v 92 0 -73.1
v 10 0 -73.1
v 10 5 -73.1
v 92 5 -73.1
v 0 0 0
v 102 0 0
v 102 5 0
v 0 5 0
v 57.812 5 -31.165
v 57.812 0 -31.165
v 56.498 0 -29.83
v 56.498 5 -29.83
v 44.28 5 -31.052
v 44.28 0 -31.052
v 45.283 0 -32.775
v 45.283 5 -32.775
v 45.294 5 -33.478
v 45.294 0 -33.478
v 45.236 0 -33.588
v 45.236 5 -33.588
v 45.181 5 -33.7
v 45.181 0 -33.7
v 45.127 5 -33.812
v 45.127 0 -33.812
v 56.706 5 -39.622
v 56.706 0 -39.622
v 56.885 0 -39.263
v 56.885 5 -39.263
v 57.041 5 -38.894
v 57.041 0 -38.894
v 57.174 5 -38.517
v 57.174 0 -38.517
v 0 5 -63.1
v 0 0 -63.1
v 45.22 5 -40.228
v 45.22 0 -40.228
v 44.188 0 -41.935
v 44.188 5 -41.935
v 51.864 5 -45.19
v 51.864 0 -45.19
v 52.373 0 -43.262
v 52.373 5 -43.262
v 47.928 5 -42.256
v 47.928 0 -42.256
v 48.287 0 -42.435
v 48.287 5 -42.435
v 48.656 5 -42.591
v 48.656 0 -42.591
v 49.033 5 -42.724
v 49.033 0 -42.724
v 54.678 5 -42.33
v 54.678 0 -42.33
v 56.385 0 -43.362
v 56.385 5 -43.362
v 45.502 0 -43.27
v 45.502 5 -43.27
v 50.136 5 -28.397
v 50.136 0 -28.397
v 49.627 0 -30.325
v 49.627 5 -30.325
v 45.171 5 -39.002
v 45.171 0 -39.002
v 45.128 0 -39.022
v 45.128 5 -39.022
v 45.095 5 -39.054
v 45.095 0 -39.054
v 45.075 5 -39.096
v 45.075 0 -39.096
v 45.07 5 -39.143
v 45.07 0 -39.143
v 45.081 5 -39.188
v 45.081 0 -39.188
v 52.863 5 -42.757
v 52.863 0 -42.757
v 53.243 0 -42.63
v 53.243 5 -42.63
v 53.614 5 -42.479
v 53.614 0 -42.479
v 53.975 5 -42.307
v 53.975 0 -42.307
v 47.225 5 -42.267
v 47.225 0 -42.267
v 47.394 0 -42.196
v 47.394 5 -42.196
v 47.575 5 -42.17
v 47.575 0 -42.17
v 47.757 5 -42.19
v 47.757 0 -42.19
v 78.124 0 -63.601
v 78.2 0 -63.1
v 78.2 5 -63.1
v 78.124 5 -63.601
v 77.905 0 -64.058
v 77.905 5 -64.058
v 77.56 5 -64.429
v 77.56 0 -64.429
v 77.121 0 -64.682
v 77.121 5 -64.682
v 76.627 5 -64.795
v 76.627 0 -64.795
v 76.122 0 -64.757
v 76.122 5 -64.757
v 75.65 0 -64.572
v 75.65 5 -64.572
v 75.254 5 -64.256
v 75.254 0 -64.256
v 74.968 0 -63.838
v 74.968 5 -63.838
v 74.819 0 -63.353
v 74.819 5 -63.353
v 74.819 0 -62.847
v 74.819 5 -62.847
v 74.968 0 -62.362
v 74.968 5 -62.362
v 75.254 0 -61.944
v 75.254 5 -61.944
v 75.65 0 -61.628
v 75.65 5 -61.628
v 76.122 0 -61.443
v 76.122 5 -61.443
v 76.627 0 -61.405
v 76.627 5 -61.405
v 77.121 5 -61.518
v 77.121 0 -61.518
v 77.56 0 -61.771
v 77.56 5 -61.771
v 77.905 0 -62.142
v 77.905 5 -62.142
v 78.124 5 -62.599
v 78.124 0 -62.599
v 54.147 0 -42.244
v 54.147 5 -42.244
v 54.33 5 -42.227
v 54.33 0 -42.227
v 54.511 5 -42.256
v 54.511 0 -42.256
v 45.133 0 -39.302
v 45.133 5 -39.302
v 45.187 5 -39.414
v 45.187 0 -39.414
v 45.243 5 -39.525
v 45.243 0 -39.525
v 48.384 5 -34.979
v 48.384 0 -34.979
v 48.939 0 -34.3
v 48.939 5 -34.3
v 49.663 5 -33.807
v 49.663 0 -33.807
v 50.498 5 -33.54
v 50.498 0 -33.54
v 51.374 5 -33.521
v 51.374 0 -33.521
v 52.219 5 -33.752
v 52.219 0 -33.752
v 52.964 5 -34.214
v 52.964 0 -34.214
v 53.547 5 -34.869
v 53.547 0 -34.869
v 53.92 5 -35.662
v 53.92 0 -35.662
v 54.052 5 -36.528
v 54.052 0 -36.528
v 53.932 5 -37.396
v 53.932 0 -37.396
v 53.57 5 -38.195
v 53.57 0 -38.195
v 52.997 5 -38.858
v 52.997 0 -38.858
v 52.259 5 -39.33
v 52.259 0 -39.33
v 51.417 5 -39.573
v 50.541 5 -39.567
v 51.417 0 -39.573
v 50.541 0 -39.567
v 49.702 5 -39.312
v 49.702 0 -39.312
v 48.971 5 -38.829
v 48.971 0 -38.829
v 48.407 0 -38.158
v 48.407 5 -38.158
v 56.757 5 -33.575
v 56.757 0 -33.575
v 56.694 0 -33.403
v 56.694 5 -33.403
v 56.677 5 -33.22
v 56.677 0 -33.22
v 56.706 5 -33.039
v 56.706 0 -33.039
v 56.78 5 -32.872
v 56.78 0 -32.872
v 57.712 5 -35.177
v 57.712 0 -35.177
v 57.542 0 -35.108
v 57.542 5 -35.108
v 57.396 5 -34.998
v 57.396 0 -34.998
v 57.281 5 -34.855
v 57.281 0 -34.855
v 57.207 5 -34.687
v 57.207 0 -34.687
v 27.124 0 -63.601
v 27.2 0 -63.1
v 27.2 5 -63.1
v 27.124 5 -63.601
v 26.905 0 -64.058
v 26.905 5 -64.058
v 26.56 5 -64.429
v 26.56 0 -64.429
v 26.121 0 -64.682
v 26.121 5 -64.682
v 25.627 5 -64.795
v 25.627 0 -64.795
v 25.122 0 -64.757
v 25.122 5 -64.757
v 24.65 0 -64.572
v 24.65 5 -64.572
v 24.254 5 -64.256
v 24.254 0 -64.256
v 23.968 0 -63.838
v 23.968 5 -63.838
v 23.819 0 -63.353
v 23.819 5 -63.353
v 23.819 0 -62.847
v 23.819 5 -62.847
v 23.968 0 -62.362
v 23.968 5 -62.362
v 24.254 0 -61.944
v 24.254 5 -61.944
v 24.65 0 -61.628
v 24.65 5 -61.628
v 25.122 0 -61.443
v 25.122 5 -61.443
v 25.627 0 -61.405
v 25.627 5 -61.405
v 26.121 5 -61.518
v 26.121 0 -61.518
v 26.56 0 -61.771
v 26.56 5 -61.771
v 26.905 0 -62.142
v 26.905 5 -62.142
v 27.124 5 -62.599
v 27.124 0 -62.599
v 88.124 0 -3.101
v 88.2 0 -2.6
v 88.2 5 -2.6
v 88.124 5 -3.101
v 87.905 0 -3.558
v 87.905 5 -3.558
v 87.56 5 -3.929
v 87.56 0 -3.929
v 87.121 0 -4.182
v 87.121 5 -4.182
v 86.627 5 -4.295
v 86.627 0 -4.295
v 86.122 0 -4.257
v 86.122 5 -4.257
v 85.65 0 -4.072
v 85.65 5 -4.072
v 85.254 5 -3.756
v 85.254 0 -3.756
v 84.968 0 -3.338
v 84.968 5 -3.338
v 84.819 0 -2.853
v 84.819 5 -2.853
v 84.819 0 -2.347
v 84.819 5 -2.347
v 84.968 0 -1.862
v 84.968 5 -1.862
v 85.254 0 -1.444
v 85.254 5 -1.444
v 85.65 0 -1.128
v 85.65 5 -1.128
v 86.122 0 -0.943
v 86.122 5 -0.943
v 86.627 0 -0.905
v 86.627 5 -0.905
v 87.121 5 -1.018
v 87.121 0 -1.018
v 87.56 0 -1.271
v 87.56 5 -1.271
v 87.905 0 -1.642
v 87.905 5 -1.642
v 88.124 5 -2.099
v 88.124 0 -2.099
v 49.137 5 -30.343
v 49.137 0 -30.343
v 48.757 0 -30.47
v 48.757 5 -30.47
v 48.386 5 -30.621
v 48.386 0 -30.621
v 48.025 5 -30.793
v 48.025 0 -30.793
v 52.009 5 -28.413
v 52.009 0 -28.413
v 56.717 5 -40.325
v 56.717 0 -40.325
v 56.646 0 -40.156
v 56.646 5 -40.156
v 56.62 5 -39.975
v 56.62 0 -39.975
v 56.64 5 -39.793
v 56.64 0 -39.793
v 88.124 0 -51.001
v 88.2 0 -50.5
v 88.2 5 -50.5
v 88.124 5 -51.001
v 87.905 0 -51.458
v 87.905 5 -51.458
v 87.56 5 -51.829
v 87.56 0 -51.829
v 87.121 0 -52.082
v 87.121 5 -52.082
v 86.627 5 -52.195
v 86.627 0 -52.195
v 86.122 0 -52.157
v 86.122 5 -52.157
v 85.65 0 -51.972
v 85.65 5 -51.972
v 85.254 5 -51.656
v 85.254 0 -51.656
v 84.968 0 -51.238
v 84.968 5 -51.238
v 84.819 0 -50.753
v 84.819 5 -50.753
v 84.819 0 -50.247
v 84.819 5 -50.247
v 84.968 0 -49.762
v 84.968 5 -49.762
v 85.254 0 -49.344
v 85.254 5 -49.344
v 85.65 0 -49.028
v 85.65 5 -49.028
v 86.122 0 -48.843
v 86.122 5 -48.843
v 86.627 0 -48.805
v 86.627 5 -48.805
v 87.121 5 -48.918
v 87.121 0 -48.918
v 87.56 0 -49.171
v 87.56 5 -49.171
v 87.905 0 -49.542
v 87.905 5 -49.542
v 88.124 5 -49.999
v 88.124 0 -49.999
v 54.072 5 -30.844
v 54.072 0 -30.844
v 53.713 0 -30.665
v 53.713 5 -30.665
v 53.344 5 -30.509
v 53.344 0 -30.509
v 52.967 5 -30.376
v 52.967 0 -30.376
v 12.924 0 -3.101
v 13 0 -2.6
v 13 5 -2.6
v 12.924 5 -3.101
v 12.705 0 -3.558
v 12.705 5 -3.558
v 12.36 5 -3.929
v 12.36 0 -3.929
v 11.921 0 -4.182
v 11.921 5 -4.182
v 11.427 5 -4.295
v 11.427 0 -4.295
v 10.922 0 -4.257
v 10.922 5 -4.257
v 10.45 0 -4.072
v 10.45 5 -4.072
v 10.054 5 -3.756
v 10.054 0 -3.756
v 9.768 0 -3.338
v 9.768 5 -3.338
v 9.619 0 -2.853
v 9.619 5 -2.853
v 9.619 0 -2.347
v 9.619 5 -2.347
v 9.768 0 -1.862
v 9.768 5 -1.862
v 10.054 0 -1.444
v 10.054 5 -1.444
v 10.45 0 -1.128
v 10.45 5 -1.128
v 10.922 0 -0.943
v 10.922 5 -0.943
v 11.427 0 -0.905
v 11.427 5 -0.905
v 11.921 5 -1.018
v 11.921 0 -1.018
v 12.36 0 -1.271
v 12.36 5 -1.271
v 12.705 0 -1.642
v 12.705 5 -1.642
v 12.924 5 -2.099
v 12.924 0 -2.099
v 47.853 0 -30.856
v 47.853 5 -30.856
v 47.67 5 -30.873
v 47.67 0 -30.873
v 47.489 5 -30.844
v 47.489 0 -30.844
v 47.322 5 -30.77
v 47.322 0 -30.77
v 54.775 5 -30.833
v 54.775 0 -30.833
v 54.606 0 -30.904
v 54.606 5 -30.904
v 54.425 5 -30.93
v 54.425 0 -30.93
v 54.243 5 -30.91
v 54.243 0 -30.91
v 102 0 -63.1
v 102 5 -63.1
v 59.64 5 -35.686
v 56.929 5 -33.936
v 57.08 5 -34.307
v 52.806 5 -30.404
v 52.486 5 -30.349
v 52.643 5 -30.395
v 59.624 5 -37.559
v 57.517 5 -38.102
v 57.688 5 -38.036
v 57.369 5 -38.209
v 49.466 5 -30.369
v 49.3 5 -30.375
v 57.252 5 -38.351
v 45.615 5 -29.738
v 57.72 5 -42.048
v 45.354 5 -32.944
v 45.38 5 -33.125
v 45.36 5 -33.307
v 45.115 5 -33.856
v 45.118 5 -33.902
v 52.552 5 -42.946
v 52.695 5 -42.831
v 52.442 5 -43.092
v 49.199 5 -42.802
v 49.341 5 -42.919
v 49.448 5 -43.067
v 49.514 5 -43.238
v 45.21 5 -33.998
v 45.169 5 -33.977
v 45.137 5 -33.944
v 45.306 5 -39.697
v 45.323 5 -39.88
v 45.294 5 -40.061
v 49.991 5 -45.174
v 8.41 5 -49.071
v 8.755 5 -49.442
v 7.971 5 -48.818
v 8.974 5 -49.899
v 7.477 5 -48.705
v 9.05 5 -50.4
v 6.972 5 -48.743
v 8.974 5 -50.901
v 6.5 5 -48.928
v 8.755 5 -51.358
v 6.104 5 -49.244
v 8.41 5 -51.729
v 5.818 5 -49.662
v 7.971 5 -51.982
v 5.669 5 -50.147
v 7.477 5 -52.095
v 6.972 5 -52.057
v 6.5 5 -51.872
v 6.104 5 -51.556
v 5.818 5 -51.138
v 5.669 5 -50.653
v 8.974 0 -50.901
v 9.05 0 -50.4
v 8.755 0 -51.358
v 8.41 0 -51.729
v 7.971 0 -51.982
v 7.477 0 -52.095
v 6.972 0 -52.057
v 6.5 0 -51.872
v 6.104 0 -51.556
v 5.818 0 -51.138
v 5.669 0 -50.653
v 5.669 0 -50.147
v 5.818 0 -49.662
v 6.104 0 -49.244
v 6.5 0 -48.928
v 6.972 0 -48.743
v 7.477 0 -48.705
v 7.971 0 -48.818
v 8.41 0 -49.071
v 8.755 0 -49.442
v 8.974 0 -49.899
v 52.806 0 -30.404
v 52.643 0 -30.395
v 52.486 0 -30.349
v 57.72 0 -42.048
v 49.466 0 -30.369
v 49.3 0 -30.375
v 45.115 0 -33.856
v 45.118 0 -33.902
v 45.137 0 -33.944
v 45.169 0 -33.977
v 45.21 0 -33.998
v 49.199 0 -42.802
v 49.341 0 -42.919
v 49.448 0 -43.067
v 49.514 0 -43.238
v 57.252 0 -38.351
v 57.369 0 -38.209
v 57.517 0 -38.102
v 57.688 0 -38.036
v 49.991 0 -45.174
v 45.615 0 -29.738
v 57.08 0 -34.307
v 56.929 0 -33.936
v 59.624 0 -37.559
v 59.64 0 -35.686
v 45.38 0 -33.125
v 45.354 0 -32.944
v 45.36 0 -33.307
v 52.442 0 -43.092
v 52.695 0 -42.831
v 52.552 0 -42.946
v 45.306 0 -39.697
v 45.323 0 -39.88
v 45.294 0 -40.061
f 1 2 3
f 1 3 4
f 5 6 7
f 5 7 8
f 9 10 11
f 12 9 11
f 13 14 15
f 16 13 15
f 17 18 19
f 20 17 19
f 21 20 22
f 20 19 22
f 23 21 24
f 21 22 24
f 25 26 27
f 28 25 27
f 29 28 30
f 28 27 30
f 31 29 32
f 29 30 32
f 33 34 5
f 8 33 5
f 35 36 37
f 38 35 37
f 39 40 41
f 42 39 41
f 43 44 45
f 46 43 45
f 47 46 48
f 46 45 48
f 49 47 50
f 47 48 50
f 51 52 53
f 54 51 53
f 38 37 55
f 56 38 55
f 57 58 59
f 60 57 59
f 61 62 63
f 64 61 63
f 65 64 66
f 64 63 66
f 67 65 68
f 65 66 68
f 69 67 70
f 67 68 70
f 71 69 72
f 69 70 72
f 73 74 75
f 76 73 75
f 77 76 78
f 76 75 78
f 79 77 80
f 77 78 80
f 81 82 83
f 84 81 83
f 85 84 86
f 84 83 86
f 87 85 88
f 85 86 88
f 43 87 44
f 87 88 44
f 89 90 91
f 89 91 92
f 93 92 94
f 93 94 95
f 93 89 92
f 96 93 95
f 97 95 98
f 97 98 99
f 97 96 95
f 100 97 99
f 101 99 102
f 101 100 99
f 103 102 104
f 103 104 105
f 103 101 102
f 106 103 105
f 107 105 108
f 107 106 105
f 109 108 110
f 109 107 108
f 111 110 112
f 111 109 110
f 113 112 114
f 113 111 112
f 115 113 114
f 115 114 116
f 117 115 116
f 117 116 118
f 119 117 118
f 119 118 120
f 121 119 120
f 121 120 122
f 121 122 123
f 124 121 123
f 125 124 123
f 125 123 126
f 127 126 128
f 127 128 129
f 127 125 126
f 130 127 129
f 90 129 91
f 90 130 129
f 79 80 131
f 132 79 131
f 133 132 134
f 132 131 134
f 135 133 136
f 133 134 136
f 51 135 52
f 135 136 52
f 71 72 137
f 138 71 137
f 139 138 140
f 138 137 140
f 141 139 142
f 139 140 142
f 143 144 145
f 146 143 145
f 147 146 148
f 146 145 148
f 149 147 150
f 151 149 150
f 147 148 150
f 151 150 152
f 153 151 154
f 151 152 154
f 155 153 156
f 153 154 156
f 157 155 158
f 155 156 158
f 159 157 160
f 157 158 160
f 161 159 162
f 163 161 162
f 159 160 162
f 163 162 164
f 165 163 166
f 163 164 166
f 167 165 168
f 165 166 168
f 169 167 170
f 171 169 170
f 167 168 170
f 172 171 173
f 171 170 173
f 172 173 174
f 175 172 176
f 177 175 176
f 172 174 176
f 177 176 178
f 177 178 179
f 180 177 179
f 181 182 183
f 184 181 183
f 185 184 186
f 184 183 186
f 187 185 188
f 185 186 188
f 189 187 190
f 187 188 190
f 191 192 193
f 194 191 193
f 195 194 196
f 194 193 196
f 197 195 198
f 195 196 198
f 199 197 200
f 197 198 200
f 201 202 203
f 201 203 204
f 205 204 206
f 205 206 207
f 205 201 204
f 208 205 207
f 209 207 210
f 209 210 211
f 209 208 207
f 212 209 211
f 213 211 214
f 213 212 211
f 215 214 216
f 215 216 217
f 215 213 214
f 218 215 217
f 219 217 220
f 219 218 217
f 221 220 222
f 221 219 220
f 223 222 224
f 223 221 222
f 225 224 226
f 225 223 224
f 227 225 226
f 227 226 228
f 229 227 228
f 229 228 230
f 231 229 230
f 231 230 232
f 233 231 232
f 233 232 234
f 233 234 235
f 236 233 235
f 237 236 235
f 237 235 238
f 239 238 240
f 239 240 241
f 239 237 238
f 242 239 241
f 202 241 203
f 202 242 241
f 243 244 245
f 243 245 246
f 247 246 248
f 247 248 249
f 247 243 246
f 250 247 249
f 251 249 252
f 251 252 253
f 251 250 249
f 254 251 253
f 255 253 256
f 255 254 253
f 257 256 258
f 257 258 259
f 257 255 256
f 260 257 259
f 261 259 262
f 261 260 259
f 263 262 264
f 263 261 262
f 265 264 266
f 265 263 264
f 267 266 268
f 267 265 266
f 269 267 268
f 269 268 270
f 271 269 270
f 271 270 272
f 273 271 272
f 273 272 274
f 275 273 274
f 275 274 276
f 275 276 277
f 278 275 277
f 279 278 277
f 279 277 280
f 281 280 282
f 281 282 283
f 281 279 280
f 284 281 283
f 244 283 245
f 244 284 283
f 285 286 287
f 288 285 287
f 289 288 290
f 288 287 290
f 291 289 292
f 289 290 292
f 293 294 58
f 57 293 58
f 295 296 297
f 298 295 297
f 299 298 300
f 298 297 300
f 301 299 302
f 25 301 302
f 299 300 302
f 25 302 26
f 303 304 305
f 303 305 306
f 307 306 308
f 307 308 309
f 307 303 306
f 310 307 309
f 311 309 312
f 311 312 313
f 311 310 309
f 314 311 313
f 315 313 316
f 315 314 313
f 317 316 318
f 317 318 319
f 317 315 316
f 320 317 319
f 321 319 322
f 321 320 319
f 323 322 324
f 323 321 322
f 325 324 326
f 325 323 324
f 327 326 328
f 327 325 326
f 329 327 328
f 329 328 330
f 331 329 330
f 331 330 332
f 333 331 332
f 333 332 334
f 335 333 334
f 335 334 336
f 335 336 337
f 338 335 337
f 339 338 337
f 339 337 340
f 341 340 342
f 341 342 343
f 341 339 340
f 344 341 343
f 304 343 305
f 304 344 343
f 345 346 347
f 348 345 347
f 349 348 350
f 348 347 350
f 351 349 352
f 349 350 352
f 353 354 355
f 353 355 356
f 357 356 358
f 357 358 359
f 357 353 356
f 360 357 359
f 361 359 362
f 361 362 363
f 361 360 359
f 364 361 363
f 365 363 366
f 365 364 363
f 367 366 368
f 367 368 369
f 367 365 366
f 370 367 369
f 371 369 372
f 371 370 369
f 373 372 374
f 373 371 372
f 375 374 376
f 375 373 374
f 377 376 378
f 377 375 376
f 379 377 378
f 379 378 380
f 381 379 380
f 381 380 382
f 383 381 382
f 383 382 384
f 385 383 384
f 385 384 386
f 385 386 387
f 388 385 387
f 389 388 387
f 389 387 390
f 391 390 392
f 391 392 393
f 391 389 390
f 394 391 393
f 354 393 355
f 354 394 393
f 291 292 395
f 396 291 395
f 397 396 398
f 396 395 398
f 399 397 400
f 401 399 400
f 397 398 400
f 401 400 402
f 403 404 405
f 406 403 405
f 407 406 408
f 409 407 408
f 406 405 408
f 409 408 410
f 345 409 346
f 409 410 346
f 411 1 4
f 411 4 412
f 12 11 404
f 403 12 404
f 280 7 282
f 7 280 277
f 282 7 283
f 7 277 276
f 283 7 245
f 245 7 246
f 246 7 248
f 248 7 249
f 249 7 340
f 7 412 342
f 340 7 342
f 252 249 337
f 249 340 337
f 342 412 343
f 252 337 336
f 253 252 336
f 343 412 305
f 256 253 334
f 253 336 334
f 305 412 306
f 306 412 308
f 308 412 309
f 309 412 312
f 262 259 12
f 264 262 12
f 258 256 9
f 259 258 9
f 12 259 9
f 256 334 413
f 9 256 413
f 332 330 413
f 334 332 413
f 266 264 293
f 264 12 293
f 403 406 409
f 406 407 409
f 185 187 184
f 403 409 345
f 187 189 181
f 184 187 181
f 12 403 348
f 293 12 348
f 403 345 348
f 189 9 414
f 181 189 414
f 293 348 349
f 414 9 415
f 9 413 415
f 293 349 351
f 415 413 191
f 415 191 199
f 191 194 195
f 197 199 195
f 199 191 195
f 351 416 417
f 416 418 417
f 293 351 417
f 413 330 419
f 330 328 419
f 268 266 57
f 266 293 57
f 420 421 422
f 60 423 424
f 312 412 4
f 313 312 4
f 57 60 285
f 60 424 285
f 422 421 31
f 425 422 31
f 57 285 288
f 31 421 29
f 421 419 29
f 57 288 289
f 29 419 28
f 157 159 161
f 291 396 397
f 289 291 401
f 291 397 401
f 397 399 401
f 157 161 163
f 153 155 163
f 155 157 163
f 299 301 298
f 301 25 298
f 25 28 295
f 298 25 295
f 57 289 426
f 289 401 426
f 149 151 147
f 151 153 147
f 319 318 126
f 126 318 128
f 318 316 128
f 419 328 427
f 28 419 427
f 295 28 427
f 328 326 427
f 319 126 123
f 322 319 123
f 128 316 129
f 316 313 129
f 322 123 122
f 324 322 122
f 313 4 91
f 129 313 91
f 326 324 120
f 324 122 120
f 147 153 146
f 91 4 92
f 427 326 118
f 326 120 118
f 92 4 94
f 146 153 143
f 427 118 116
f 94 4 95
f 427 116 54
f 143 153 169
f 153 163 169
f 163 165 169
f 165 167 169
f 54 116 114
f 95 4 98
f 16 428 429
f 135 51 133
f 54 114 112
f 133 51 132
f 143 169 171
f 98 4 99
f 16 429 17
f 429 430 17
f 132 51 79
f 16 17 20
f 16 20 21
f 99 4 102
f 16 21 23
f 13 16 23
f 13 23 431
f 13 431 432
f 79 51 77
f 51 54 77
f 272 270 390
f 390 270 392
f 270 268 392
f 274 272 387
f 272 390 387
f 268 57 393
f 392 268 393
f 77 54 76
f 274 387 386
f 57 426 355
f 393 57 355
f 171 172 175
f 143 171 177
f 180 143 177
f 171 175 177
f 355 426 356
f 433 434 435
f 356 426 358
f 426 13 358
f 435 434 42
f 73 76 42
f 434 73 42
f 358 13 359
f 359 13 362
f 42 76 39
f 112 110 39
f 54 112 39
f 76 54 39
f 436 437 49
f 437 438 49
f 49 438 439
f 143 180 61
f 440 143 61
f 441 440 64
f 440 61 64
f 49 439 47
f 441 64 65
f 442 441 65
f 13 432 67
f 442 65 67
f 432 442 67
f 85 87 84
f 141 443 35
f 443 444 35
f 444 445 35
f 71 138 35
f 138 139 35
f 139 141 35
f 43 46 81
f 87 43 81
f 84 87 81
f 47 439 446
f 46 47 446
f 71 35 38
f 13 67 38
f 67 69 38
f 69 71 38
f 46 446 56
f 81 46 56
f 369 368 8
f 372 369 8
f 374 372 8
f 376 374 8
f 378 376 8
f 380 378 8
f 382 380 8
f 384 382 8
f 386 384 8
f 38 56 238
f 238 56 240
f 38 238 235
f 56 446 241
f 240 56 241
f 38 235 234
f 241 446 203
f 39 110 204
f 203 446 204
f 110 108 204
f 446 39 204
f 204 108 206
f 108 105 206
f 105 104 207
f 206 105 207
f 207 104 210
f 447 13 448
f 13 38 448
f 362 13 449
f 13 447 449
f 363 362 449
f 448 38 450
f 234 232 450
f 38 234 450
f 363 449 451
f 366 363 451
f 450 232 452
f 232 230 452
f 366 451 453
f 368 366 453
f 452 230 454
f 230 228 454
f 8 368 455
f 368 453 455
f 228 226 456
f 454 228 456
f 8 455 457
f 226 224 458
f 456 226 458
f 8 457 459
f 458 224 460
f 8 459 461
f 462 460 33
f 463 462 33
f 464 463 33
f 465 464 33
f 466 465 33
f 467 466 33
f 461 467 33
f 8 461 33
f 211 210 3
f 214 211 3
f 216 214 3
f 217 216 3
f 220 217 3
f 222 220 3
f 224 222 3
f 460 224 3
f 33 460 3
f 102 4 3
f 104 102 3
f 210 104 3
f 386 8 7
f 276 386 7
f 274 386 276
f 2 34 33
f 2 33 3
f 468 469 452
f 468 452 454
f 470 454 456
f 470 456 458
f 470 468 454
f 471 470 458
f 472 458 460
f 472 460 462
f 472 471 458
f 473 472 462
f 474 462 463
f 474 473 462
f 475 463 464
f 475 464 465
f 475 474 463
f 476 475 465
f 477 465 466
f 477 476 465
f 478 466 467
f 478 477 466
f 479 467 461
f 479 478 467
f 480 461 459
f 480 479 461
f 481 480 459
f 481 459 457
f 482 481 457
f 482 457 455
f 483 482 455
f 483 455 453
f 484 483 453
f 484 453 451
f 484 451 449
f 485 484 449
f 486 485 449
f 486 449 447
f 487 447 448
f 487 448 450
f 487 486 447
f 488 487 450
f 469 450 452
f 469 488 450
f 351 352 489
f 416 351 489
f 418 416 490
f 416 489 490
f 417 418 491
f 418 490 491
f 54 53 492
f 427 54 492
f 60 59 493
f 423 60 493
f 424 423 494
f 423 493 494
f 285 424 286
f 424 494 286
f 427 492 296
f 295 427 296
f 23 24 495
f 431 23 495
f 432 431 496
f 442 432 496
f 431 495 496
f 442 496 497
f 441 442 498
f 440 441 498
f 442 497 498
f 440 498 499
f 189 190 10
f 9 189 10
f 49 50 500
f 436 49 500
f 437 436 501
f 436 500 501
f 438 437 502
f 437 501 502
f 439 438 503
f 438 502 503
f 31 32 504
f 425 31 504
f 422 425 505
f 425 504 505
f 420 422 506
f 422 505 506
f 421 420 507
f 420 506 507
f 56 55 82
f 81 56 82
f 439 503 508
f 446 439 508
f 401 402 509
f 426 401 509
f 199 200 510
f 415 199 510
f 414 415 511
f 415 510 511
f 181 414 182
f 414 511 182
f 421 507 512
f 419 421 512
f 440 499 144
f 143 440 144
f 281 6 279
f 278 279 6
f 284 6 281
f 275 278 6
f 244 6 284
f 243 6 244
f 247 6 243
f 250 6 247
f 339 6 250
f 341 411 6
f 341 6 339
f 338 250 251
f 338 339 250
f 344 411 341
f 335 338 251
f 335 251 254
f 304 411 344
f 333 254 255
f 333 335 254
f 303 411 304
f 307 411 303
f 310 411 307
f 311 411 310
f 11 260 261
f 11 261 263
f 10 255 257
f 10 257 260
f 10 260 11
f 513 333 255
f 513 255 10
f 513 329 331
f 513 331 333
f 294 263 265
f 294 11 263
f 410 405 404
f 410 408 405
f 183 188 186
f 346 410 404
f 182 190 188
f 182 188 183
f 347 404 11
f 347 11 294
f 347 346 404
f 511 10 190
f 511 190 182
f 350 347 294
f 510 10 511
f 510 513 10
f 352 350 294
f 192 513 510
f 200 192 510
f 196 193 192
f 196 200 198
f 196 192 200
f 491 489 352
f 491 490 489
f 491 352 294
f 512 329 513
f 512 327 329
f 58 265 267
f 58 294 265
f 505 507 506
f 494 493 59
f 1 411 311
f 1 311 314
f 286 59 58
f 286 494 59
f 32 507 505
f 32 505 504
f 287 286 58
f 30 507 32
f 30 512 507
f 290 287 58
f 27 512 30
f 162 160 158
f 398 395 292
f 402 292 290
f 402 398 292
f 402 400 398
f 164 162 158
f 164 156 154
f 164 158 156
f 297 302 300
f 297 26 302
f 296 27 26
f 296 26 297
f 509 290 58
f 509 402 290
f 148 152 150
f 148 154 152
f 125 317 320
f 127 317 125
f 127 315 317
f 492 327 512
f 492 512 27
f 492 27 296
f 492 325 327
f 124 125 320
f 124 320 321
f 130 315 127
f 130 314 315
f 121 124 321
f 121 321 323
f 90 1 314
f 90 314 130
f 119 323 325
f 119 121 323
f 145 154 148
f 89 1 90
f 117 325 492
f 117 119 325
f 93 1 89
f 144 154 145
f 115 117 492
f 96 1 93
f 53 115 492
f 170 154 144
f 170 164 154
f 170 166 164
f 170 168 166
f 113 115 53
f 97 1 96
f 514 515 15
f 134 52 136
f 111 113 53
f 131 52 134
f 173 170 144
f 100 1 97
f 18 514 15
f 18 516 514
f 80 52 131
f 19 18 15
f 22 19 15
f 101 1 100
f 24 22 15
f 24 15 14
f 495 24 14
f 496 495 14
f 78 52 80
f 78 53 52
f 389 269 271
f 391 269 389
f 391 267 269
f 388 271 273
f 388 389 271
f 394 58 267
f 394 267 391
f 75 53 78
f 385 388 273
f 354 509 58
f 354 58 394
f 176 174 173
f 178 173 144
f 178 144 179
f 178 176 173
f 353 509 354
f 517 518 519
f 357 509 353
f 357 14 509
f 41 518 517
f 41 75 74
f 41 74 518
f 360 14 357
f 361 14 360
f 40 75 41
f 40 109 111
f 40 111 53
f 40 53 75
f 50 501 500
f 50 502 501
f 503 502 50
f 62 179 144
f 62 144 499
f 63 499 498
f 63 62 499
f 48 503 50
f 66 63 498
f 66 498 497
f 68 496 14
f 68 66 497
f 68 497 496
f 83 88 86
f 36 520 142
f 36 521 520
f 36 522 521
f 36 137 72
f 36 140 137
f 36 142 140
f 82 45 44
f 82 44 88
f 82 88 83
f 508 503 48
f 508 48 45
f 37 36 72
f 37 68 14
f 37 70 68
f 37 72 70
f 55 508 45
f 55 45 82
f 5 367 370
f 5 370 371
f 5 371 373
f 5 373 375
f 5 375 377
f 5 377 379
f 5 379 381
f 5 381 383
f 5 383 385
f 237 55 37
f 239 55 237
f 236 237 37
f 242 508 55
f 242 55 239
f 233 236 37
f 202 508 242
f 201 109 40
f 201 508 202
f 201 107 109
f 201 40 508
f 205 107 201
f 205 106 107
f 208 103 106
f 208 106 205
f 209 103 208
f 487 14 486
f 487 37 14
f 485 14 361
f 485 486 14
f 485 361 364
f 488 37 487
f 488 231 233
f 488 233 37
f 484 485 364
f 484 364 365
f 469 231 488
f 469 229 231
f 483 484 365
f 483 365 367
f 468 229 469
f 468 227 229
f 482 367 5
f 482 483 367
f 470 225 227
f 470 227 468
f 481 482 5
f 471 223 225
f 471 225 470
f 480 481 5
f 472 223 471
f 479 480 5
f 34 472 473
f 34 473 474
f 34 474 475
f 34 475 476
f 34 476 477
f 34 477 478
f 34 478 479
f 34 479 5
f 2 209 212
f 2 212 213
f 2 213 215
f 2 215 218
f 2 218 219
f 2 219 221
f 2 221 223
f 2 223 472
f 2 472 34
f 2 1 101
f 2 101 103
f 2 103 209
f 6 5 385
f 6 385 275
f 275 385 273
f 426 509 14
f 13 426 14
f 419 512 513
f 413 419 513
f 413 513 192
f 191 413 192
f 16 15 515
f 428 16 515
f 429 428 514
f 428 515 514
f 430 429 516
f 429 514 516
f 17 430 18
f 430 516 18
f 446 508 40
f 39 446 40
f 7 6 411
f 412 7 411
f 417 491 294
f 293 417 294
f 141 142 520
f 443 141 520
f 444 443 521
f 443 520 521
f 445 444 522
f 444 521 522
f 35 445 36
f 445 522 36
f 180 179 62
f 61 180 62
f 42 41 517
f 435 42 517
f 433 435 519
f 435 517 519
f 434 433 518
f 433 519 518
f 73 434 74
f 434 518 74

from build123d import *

# Parameters (mm, degrees)
CROQUIS1_R              = 1.7
SALIENTE_EXTRUIR1_DEPTH = 5


with BuildPart() as part:
    # Croquis1 → Saliente-Extruir1 (new body)
    with BuildSketch(Plane(origin=(0, 0, 0), x_dir=(1, 0, 0), z_dir=(0, 1, 0))):
        Polygon((0, 53.1), (0, 63.1), (10, 73.1), (92, 73.1), (102, 63.1), (102, 53.1), (102, 0), (0, 0), align=None)
        with Locations((7.35, 50.4)):
            Circle(CROQUIS1_R, mode=Mode.SUBTRACT)
        with Locations((11.3, 2.6)):
            Circle(CROQUIS1_R, mode=Mode.SUBTRACT)
        with Locations((86.5, 50.5)):
            Circle(CROQUIS1_R, mode=Mode.SUBTRACT)
        with Locations((86.5, 2.6)):
            Circle(CROQUIS1_R, mode=Mode.SUBTRACT)
        with Locations((25.5, 63.1)):
            Circle(CROQUIS1_R, mode=Mode.SUBTRACT)
        with Locations((76.5, 63.1)):
            Circle(CROQUIS1_R, mode=Mode.SUBTRACT)
        with BuildLine():
            Line((44.188139939, 41.934668839), (45.501537669, 43.270342848))
            Line((45.501537669, 43.270342848), (47.224863288, 42.26739732))
            ThreePointArc((47.224863288, 42.26739732), (47.575067996, 42.169782903), (47.928320792, 42.255715279))
            ThreePointArc((47.928320792, 42.255715279), (48.469957789, 42.515675688), (49.033343063, 42.724355067))
            ThreePointArc((49.033343063, 42.724355067), (49.340671144, 42.918574947), (49.513928995, 43.23818976))
            Line((49.513928995, 43.23818976), (49.990823409, 45.174248292))
            Line((49.990823409, 45.174248292), (51.864, 45.19))
            Line((51.864, 45.19), (52.373385647, 43.262235184))
            ThreePointArc((52.373385647, 43.262235184), (52.551993955, 42.945579245), (52.862544768, 42.756555163))
            ThreePointArc((52.862544768, 42.756555163), (53.429359729, 42.557379737), (53.975291881, 42.306564794))
            ThreePointArc((53.975291881, 42.306564794), (54.329939845, 42.226585218), (54.678453448, 42.330075218))
            Line((54.678453448, 42.330075218), (56.384668839, 43.361860061))
            Line((56.384668839, 43.361860061), (57.720342848, 42.048462331))
            Line((57.720342848, 42.048462331), (56.71739732, 40.325136712))
            ThreePointArc((56.71739732, 40.325136712), (56.619782903, 39.974932004), (56.705715279, 39.621679208))
            ThreePointArc((56.705715279, 39.621679208), (56.965675688, 39.080042211), (57.174355067, 38.516656937))
            ThreePointArc((57.174355067, 38.516656937), (57.368574947, 38.209328856), (57.68818976, 38.036071005))
            Line((57.68818976, 38.036071005), (59.624248292, 37.559176591))
            Line((59.624248292, 37.559176591), (59.64, 35.686))
            Line((59.64, 35.686), (57.712235184, 35.176614353))
            ThreePointArc((57.712235184, 35.176614353), (57.395579245, 34.998006045), (57.206555163, 34.687455232))
            ThreePointArc((57.206555163, 34.687455232), (57.007379737, 34.120640271), (56.756564794, 33.574708119))
            ThreePointArc((56.756564794, 33.574708119), (56.676585218, 33.220060155), (56.780075218, 32.871546552))
            Line((56.780075218, 32.871546552), (57.811860061, 31.165331161))
            Line((57.811860061, 31.165331161), (56.498462331, 29.829657152))
            Line((56.498462331, 29.829657152), (54.775136712, 30.83260268))
            ThreePointArc((54.775136712, 30.83260268), (54.424932004, 30.930217097), (54.071679208, 30.844284721))
            ThreePointArc((54.071679208, 30.844284721), (53.530042211, 30.584324312), (52.966656937, 30.375644933))
            ThreePointArc((52.966656937, 30.375644933), (52.724095072, 30.403806003), (52.486071005, 30.349273006))
            Line((52.486071005, 30.349273006), (52.009176591, 28.413214474))
            Line((52.009176591, 28.413214474), (50.136, 28.397462767))
            Line((50.136, 28.397462767), (49.626614353, 30.325227583))
            ThreePointArc((49.626614353, 30.325227583), (49.383630447, 30.377181799), (49.137455232, 30.343444837))
            ThreePointArc((49.137455232, 30.343444837), (48.570640271, 30.542620263), (48.024708119, 30.793435206))
            ThreePointArc((48.024708119, 30.793435206), (47.670060155, 30.873414782), (47.321546552, 30.769924782))
            Line((47.321546552, 30.769924782), (45.615331161, 29.738139939))
            Line((45.615331161, 29.738139939), (44.279657152, 31.051537669))
            Line((44.279657152, 31.051537669), (45.28260268, 32.774863288))
            ThreePointArc((45.28260268, 32.774863288), (45.380217097, 33.125067996), (45.294284721, 33.478320792))
            ThreePointArc((45.294284721, 33.478320792), (45.208247472, 33.643799276), (45.127008205, 33.811685303))
            ThreePointArc((45.127008205, 33.811685303), (45.125953752, 33.923547873), (45.209575503, 33.997856347))
            Line((45.209575503, 33.997856347), (48.384042323, 34.978554615))
            ThreePointArc((48.384042323, 34.978554615), (54.05159058, 36.528318352), (48.406635637, 38.158457784))
            Line((48.406635637, 38.158457784), (45.170602247, 39.00232588))
            ThreePointArc((45.170602247, 39.00232588), (45.082937198, 39.074508031), (45.08129489, 39.188054174))
            ThreePointArc((45.08129489, 39.188054174), (45.159930296, 39.35784363), (45.243435206, 39.525291881))
            ThreePointArc((45.243435206, 39.525291881), (45.323414782, 39.879939845), (45.219924782, 40.228453448))
            Line((45.219924782, 40.228453448), (44.188139939, 41.934668839))
        make_face(mode=Mode.SUBTRACT)
    extrude(amount=SALIENTE_EXTRUIR1_DEPTH)


solid = part.part
